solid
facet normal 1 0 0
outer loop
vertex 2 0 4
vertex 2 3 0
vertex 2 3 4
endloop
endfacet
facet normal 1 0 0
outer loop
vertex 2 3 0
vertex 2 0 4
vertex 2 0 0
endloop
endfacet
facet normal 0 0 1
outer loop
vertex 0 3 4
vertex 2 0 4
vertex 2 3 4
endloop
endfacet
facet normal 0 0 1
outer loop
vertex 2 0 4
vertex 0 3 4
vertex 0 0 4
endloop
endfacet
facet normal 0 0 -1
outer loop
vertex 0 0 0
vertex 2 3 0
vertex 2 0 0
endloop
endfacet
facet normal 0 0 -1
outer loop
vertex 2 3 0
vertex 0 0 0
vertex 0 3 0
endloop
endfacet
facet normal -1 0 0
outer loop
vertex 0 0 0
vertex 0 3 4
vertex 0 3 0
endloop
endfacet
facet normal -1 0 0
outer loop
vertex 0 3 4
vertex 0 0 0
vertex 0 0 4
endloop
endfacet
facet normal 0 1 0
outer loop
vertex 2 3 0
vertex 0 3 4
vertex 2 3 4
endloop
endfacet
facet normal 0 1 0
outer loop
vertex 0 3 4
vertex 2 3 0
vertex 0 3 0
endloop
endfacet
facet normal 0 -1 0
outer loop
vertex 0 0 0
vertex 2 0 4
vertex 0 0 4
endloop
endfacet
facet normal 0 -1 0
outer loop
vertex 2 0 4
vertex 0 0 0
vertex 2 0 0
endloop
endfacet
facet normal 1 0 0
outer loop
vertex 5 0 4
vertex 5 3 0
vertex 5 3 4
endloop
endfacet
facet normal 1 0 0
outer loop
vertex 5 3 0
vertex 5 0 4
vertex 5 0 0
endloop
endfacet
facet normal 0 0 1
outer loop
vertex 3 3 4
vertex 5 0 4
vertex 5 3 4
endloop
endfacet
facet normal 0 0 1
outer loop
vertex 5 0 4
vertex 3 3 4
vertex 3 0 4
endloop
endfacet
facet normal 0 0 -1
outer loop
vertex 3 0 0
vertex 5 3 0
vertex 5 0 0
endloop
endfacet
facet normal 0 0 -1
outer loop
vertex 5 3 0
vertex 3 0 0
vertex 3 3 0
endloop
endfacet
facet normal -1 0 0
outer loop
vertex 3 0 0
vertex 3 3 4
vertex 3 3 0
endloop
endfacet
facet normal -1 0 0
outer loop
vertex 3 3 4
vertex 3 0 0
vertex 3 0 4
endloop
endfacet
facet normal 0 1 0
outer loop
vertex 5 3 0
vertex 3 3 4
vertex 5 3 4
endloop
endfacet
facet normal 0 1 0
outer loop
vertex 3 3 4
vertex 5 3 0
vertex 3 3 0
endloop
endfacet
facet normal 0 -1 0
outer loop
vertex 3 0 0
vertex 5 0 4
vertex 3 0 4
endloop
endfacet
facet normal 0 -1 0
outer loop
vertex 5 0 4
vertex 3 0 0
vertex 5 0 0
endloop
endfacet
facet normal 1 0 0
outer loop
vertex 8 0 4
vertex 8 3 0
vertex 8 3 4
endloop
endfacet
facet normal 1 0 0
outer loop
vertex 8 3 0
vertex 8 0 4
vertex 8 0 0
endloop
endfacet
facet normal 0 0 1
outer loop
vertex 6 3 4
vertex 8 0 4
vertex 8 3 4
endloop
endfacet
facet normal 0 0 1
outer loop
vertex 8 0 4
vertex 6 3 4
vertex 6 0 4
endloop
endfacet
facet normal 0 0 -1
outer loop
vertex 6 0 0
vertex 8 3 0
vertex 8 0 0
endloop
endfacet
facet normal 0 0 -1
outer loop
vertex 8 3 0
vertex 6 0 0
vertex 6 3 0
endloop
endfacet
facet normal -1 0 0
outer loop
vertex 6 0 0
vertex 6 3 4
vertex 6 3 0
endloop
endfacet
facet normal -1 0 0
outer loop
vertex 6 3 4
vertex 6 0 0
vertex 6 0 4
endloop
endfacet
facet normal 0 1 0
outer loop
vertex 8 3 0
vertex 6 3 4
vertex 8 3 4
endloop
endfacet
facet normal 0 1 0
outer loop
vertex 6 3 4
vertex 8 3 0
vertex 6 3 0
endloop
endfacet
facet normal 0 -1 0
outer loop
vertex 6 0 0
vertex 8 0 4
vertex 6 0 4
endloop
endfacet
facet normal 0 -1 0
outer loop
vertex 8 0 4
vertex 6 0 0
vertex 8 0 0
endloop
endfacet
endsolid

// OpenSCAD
//Cube height
height = 4;
//Cube thickness
thickness = 3; //[1,2,3,4,5]
//Cube width
width = 2; //[2:5]

color([1,0,0]) cube([width,thickness,height]);
translate([3,0,0])
color([0,1,0]) cube([width,thickness,height]);
translate([6,0,0])
color([0,0,1]) cube([width,thickness,height]);
